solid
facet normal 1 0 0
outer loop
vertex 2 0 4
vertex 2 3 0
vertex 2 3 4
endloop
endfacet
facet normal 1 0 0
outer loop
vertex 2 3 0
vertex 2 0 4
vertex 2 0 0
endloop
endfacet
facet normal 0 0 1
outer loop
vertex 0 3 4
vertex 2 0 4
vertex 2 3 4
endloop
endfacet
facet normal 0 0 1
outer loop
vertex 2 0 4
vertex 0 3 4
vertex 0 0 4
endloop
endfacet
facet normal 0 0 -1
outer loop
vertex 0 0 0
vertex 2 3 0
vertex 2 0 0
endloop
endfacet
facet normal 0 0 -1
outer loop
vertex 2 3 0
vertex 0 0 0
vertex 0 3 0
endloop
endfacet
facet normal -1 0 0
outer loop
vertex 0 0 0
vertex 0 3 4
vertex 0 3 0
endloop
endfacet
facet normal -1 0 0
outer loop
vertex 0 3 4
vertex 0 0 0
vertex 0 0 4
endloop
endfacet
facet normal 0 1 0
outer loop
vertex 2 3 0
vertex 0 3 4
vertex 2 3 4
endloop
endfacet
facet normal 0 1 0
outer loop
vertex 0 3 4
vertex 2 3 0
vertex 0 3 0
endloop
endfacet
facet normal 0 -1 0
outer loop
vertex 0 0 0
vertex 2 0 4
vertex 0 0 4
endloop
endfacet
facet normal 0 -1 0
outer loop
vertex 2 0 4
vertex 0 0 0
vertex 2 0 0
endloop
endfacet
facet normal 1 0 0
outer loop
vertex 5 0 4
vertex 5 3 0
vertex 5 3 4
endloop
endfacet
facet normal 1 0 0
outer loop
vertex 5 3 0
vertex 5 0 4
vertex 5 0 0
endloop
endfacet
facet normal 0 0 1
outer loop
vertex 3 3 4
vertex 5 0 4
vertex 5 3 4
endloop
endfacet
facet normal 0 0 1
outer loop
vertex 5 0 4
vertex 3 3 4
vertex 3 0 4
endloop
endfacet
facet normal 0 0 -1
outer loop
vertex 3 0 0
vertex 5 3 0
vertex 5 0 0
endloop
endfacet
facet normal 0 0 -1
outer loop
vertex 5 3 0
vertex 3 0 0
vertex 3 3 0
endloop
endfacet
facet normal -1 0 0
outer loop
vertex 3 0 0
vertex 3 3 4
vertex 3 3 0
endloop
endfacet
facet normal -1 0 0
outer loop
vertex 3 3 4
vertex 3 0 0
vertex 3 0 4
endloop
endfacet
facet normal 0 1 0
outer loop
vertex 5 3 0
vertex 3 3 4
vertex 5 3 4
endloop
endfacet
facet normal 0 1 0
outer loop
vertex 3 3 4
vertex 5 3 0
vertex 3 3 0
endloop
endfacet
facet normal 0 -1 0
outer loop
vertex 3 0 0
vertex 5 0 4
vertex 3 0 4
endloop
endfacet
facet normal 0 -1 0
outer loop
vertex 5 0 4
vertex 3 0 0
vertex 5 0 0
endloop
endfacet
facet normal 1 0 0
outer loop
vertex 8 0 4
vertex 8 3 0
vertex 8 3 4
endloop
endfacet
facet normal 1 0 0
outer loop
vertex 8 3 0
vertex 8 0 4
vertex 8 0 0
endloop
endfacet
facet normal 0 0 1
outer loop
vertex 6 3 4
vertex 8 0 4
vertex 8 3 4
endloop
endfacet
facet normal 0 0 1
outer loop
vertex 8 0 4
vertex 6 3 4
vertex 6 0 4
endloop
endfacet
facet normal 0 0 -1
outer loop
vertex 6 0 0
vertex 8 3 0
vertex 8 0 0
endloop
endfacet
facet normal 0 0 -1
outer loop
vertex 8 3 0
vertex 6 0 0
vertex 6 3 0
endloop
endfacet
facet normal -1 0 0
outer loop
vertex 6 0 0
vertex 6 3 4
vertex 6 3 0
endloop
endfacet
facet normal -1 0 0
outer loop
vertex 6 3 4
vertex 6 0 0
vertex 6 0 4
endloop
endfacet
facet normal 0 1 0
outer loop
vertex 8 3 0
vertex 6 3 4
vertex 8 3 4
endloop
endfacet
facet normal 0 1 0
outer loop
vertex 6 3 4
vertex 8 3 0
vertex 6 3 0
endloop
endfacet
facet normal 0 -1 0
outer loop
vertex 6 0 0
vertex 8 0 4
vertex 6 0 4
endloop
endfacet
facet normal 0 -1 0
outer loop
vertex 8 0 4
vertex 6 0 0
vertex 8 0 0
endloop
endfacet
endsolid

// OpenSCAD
//Cube height
height = 4;
//Cube thickness
thickness = 3; //[1,2,3,4,5]
//Cube width
width = 2; //[2:5]

color([1,0,0]) cube([width,thickness,height]);
translate([3,0,0])
color([0,1,0]) cube([width,thickness,height]);
translate([6,0,0])
color([0,0,1]) cube([width,thickness,height]);
